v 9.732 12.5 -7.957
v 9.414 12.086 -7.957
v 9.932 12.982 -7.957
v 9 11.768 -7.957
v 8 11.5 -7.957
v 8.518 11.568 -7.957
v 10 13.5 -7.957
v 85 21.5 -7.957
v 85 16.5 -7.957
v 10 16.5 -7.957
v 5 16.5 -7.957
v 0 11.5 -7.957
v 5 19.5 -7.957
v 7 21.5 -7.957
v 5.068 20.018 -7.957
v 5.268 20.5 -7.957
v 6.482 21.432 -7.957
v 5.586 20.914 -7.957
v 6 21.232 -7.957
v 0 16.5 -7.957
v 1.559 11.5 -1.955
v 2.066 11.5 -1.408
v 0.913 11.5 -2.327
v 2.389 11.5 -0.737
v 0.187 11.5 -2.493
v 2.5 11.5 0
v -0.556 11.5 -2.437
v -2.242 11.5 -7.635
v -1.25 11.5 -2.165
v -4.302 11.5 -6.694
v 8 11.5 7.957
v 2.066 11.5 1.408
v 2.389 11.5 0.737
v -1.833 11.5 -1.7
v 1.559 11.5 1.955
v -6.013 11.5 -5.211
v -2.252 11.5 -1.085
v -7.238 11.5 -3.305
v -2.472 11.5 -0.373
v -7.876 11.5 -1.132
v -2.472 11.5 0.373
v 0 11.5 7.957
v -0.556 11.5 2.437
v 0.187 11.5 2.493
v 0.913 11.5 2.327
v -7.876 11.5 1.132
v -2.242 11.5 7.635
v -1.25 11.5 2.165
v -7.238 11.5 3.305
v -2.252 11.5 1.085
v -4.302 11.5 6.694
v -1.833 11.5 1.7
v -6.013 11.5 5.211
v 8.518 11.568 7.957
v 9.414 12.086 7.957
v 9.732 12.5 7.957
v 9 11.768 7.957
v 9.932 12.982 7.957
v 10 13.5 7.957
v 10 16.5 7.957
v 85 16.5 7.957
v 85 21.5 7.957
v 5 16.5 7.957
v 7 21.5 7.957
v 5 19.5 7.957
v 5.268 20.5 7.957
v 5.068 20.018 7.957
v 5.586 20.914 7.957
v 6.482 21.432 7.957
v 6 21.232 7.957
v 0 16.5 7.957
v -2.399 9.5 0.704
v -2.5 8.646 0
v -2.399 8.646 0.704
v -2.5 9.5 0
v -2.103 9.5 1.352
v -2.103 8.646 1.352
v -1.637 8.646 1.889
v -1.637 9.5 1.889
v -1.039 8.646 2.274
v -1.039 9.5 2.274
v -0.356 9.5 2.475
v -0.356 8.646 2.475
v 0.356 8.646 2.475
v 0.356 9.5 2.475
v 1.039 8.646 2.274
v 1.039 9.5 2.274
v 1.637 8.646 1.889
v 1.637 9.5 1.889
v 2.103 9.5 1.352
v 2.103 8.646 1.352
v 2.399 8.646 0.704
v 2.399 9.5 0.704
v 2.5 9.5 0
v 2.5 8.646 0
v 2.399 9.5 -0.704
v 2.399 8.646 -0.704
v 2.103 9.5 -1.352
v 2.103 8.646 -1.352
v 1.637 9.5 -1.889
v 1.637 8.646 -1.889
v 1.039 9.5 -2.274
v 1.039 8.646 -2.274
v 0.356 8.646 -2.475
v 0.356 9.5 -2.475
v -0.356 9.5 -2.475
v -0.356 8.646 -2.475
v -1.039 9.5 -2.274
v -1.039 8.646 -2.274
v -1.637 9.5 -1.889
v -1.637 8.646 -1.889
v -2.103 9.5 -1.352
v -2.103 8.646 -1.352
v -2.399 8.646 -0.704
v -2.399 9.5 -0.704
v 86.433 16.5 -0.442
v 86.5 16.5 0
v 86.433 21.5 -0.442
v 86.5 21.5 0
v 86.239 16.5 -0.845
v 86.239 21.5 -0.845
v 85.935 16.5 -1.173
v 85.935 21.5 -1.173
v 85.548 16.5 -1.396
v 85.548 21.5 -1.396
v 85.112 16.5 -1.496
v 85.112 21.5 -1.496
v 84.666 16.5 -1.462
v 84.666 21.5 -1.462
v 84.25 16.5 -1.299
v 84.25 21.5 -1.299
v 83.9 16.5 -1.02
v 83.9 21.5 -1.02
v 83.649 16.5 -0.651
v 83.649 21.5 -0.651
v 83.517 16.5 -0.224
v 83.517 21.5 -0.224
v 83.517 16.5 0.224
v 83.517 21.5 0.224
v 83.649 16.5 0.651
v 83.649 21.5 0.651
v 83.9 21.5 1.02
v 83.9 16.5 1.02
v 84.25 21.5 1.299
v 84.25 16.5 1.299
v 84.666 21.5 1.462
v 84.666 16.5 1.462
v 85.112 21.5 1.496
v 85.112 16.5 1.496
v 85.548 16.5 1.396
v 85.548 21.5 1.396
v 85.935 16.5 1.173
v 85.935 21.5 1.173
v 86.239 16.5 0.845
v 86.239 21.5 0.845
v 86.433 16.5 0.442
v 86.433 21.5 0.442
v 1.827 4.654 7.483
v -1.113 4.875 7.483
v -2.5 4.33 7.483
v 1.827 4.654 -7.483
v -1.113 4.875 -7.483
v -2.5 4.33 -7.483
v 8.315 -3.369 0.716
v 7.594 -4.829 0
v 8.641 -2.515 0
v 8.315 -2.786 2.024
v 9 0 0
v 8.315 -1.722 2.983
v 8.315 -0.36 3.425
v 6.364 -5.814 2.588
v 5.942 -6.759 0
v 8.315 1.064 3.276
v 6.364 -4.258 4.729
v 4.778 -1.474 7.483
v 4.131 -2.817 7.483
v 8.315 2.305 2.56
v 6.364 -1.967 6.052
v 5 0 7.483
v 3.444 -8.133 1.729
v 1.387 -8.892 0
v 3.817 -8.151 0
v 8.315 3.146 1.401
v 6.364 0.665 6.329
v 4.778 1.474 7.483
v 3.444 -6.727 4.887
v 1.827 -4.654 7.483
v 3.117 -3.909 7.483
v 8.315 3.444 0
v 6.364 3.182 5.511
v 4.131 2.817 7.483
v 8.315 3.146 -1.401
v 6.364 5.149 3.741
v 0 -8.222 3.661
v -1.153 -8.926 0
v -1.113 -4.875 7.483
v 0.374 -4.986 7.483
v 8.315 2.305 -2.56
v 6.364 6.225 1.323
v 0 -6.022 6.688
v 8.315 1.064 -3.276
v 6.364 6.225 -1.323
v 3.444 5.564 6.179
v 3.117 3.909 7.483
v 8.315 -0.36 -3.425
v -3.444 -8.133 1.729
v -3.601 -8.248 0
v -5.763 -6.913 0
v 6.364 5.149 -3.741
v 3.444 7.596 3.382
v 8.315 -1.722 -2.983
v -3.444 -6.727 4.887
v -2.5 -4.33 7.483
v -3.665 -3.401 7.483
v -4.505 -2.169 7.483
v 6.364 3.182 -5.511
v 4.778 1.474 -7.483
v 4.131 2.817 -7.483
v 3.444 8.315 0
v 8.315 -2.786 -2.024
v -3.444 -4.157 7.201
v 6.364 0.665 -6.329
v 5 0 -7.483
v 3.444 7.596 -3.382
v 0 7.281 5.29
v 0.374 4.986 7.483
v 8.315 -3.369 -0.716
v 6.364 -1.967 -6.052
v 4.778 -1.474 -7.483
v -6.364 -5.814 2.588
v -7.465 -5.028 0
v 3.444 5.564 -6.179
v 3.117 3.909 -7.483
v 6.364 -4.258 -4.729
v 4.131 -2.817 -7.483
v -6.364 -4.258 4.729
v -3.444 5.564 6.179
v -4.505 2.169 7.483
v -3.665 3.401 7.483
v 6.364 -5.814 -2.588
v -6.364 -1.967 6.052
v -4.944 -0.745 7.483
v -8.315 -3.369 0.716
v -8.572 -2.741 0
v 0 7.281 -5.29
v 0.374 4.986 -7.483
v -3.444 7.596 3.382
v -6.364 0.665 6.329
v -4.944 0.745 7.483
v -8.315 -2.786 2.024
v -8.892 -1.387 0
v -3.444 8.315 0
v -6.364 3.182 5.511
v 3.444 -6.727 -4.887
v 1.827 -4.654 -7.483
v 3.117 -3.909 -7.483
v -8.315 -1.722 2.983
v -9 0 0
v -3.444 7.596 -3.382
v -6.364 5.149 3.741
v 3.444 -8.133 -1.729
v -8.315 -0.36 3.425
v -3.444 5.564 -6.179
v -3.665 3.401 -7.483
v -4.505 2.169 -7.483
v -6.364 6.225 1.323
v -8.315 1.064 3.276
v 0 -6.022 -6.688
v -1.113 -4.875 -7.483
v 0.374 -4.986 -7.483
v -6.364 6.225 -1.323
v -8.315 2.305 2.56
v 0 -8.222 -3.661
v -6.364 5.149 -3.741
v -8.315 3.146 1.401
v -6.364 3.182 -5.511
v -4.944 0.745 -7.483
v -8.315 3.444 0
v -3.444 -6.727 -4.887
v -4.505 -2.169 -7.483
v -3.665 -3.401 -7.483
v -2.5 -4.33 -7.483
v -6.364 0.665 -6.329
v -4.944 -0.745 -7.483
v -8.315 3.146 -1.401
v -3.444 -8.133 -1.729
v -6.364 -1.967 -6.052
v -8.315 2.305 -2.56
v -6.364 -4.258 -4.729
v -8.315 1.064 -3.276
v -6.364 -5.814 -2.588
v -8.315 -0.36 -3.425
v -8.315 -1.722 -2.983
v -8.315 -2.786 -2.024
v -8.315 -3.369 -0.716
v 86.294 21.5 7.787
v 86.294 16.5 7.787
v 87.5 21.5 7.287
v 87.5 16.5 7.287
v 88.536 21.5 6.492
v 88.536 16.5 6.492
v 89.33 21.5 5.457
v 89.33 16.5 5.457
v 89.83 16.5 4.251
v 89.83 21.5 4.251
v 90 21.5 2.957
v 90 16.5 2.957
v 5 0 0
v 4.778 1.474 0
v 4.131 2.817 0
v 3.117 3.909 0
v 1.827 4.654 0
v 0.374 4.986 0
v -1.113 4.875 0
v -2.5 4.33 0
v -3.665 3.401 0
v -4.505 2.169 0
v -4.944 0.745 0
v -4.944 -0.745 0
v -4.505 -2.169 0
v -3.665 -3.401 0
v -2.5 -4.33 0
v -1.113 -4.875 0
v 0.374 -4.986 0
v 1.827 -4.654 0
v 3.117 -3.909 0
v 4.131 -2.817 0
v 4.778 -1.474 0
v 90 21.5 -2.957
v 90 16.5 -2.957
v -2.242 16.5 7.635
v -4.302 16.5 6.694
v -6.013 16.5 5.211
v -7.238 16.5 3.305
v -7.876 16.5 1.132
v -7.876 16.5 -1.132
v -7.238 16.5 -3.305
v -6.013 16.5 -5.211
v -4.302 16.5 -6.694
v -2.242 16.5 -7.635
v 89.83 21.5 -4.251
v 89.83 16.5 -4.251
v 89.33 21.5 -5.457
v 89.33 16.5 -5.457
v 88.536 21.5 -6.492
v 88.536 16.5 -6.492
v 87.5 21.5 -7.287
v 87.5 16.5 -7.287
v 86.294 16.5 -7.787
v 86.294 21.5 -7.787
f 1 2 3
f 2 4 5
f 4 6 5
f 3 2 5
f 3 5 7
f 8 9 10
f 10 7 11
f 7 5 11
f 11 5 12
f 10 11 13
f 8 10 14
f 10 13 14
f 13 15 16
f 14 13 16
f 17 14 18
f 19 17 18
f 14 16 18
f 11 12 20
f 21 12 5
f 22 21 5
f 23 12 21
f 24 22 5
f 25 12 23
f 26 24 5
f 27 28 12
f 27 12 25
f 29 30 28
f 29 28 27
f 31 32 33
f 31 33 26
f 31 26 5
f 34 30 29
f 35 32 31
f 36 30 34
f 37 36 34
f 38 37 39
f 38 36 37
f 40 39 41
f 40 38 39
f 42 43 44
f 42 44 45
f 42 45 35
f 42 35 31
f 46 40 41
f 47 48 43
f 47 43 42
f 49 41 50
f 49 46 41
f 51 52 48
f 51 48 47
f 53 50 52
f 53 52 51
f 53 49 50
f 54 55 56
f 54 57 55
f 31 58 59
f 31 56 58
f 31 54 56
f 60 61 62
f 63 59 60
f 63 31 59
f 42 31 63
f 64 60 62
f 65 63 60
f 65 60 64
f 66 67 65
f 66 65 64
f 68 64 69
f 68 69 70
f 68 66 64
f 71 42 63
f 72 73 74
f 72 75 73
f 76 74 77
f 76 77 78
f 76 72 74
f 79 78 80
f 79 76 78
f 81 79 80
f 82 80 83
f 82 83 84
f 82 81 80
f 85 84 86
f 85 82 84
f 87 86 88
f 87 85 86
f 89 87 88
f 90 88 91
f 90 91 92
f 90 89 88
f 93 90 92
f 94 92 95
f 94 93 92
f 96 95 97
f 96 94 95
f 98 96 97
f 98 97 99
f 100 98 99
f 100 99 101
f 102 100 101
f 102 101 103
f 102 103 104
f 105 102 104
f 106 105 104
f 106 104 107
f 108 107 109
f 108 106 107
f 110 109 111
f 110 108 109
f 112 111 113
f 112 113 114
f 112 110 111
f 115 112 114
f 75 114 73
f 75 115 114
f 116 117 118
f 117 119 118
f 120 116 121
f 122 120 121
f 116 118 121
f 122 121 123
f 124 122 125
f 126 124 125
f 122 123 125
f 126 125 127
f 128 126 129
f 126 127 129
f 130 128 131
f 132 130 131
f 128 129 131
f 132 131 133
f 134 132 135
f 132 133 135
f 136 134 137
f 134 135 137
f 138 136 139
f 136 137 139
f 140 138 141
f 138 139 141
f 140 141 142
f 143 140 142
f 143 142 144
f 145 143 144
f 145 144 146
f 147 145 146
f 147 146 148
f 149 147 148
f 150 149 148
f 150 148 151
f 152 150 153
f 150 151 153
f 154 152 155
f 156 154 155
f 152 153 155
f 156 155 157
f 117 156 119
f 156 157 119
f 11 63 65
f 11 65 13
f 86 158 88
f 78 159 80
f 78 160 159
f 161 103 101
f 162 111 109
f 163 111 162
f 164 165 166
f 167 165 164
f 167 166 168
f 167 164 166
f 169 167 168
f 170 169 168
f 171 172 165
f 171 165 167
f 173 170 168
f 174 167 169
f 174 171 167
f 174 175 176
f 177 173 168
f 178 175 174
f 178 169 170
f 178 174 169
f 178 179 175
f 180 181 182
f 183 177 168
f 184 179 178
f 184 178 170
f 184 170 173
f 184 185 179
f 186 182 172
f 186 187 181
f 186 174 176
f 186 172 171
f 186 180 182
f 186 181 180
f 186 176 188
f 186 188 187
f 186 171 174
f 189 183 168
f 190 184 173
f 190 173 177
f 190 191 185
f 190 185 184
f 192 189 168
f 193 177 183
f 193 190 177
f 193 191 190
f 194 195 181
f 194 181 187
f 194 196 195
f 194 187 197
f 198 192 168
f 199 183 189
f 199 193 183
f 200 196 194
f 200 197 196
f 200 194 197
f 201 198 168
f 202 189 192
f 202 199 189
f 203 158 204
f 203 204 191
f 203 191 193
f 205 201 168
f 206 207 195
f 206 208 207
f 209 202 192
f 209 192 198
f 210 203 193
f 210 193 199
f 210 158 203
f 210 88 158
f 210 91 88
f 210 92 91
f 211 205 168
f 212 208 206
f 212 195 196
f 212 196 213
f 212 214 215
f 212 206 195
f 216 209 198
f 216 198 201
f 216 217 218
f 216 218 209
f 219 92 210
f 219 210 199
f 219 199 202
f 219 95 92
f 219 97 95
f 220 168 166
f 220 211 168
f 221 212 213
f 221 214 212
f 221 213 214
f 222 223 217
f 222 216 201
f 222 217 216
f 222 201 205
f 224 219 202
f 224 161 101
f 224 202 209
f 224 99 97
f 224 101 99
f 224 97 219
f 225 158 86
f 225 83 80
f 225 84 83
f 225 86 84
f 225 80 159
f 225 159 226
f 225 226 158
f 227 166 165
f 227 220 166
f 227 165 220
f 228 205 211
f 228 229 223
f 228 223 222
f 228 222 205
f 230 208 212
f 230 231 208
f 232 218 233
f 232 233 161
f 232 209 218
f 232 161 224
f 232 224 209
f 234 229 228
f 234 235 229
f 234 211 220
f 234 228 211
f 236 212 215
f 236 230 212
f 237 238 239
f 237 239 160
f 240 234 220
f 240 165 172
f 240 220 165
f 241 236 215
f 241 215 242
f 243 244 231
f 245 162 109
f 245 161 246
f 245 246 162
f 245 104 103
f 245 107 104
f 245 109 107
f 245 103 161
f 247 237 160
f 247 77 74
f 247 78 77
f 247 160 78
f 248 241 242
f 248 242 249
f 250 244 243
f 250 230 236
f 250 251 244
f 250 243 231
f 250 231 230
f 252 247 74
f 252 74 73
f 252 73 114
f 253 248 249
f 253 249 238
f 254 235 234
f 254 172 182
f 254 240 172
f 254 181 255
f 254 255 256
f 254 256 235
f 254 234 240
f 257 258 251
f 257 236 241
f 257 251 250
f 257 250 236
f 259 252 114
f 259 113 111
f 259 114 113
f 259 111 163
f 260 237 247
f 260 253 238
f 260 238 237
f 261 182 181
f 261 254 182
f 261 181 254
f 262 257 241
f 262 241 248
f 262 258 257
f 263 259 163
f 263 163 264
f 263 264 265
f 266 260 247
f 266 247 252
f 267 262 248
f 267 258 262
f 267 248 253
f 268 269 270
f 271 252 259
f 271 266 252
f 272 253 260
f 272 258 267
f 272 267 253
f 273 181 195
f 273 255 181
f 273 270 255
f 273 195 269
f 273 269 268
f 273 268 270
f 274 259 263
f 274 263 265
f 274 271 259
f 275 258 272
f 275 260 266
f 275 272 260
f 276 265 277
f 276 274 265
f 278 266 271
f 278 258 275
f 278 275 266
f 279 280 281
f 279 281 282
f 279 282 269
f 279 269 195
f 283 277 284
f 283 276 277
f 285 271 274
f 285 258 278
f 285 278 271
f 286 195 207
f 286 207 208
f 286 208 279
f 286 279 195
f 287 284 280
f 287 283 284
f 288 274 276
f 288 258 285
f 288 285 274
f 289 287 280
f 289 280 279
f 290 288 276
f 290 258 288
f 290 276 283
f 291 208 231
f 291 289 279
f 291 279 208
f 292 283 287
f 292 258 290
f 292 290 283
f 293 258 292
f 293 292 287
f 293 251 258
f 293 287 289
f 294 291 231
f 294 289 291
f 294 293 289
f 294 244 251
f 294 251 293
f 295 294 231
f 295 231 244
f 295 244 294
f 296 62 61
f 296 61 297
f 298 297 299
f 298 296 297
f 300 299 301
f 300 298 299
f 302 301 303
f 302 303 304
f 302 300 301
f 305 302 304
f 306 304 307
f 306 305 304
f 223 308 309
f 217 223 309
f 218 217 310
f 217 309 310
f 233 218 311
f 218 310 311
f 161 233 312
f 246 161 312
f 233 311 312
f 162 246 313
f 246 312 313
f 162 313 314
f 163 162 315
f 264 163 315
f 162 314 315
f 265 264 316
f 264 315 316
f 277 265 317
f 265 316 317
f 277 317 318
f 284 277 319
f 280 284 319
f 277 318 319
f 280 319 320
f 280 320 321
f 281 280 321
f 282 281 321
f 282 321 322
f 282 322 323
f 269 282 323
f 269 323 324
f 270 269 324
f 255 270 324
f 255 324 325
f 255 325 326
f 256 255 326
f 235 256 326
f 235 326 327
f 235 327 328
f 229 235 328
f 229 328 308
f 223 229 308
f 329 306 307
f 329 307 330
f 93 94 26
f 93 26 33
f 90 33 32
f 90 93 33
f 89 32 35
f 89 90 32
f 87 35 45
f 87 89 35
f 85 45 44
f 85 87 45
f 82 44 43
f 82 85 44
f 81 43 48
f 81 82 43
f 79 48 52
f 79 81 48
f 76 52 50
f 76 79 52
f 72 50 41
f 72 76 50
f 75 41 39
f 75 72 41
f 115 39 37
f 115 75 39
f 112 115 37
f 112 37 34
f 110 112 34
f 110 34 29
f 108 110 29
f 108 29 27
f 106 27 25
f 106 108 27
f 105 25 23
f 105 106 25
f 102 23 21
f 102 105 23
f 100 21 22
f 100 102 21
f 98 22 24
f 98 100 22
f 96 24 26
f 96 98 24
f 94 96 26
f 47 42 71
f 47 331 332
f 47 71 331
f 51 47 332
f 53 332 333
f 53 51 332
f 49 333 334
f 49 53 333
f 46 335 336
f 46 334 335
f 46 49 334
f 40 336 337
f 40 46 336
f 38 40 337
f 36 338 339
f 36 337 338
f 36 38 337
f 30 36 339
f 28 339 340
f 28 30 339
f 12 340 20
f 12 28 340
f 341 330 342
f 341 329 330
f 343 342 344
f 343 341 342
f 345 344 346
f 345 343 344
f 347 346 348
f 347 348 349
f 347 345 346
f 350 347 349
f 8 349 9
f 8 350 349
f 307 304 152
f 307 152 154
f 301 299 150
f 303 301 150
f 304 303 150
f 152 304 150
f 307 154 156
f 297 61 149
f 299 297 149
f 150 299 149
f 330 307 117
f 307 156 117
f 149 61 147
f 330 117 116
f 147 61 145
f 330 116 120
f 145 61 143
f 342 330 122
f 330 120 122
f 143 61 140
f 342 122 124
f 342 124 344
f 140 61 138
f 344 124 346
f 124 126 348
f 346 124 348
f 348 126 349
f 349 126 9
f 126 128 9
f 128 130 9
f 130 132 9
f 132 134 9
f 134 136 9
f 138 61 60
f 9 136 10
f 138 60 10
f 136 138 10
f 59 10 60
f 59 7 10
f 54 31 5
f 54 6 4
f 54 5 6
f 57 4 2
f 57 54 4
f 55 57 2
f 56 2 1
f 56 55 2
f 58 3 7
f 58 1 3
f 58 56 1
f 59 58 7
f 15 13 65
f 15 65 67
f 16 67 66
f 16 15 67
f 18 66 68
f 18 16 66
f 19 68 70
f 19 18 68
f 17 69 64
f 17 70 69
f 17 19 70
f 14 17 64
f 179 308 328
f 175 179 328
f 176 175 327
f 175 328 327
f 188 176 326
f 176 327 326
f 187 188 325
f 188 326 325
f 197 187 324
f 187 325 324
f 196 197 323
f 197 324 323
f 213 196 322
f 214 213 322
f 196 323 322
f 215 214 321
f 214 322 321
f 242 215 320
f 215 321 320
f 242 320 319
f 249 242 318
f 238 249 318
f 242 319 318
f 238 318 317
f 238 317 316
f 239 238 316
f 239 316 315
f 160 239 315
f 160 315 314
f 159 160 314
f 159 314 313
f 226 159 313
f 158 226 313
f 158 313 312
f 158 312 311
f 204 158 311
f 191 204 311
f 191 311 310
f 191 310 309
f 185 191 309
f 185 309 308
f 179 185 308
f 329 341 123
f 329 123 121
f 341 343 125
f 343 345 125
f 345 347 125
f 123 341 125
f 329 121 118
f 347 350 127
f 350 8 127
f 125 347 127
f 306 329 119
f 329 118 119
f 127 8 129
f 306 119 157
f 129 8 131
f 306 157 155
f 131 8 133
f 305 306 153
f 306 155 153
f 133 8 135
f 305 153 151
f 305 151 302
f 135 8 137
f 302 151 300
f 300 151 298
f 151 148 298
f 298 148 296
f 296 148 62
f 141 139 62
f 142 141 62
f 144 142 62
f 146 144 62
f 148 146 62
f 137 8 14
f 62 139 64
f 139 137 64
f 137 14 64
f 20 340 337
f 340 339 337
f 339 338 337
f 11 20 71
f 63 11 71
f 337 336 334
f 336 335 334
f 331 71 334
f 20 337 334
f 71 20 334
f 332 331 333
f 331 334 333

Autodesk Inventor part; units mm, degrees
ref_plane "YZ Plane" through (0, 0, 0) normal (1, 0, 0) x (0, 1, 0)
ref_plane "XY Plane" through (0, 0, 0) normal (0, 0, 1) x (1, 0, 0)
sketch "Skizze4" plane through (0, 0, 0) normal (0, 0, 1) x (1, 0, 0)
  line L0 (-12.6, 0) -> (12.6, 0) projected
  line L1 (0, -12.6) -> (0, 12.6) projected
  circle A0 centre (0, 0) radius 9
  point P0 (-9, 0)
  point P1 (9, 0)
  dimension "d8" = 18
revolve "Umdrehung1" add sketch "Skizze4" angle 360 about axis through (-10, 0, 0) along (1, 0, 0) picked at (-5.0484, 3.1721) picked at (5.9248, 0.6676) contours A0 L1 L0 | L1 A0 L0
ref_plane "Arbeitsebene1" through (0, 9, 0) normal (0, 1, 0) x (-1, 0, 0)
sketch "Skizze5" plane through (0, 9, 0) normal (0, 1, 0) x (-1, 0, 0)
  circle A0 centre (0, 0) radius 2.5
  dimension "d11" = 5
extrude "Extrusion3" add sketch "Skizze5" along normal mid plane 1
sketch "Skizze6" plane through (0, 9.5, 0) normal (0, 1, 0) x (1, 0, 0)
  circle A0 centre (0, 0) radius 2.5 projected
  circle A1 centre (0, 0) radius 2.5
  dimension "d14" = 5
extrude "Extrusion4" add sketch "Skizze6" along normal blind 2
sketch "Skizze7" plane through (0, 0, 0) normal (0, 0, 1) x (1, 0, 0)
  circle A0 centre (0, 0) radius 5
  dimension "d17" = 10
extrude "Extrusion5" cut sketch "Skizze7" along normal mid plane 20
sketch "Skizze8" plane through (0, 11.5, 0) normal (0, 1, 0) x (1, 0, 0)
  circle A0 centre (0, 0) radius 7.9569
  dimension "d20" = 15.9138
extrude "Extrusion6" add sketch "Skizze8" along normal blind 5
sketch "Skizze9" plane through (0, 0, 0) normal (1, 0, 0) x (0, 1, 0)
  line L0 (16.5, -7.9569) -> (16.5, 7.9569) projected
  line L1 (11.5, -7.9569) -> (11.5, 7.9569) projected
  line L2 (16.5, 7.9569) -> (11.5, 7.9569)
  line L3 (11.5, 7.9569) -> (11.5, -7.9569)
  line L4 (11.5, -7.9569) -> (16.5, -7.9569)
  line L5 (16.5, -7.9569) -> (16.5, 7.9569)
  point P0 (0, 0)
extrude "Extrusion7" add sketch "Skizze9" along normal blind 10
sketch "Skizze10" plane through (0, 16.5, 0) normal (0, 1, 0) x (1, 0, 0)
  line L0 (10, 7.9569) -> (10, -7.9569) projected
  line L1 (0, 7.9569) -> (10, 7.9569) projected
  line L2 (10, -7.9569) -> (5, -7.9569)
  line L3 (5, -7.9569) -> (5, 7.9569)
  line L4 (5, 7.9569) -> (10, 7.9569)
  line L5 (10, 7.9569) -> (10, -7.9569)
  point P0 (0, 0)
  dimension "d25" = 5
extrude "Extrusion8" add sketch "Skizze10" along normal blind 5
sketch "Skizze11" plane through (10, 0, 0) normal (1, 0, 0) x (0, 0, -1)
  line L0 (7.9569, 11.5) -> (7.9569, 21.5) projected
  line L1 (-7.9569, 11.5) -> (-7.9569, 21.5) projected
  line L2 (7.9569, 21.5) -> (-7.9569, 21.5)
  line L3 (-7.9569, 21.5) -> (-7.9569, 16.5)
  line L4 (-7.9569, 16.5) -> (7.9569, 16.5)
  line L5 (7.9569, 16.5) -> (7.9569, 21.5)
  point P0 (0, 0)
  point P1 (7.9569, 16.5)
  dimension "d28" = 5
extrude "Extrusion9" add sketch "Skizze11" along normal blind 80
fillet "Rundung2" radius 2 2 edges at (10, 11.5, 0) (5, 21.5, 0)
fillet "Rundung3" radius 5 2 edges at (90, 19, 7.9569) (90, 19, -7.9569)
sketch "Skizze12" plane through (0, 21.5, 0) normal (0, 1, 0) x (1, 0, 0)
  circle A0 centre (85, 0) radius 1.5
  line L0 (90, 2.9569) -> (90, -2.9569) projected
  point P0 (0, 0)
  dimension "d33" = 3
  dimension "d34" = 5
extrude "Extrusion10" cut sketch "Skizze12" against normal blind 5
properties part number "VentilNukleator2"
